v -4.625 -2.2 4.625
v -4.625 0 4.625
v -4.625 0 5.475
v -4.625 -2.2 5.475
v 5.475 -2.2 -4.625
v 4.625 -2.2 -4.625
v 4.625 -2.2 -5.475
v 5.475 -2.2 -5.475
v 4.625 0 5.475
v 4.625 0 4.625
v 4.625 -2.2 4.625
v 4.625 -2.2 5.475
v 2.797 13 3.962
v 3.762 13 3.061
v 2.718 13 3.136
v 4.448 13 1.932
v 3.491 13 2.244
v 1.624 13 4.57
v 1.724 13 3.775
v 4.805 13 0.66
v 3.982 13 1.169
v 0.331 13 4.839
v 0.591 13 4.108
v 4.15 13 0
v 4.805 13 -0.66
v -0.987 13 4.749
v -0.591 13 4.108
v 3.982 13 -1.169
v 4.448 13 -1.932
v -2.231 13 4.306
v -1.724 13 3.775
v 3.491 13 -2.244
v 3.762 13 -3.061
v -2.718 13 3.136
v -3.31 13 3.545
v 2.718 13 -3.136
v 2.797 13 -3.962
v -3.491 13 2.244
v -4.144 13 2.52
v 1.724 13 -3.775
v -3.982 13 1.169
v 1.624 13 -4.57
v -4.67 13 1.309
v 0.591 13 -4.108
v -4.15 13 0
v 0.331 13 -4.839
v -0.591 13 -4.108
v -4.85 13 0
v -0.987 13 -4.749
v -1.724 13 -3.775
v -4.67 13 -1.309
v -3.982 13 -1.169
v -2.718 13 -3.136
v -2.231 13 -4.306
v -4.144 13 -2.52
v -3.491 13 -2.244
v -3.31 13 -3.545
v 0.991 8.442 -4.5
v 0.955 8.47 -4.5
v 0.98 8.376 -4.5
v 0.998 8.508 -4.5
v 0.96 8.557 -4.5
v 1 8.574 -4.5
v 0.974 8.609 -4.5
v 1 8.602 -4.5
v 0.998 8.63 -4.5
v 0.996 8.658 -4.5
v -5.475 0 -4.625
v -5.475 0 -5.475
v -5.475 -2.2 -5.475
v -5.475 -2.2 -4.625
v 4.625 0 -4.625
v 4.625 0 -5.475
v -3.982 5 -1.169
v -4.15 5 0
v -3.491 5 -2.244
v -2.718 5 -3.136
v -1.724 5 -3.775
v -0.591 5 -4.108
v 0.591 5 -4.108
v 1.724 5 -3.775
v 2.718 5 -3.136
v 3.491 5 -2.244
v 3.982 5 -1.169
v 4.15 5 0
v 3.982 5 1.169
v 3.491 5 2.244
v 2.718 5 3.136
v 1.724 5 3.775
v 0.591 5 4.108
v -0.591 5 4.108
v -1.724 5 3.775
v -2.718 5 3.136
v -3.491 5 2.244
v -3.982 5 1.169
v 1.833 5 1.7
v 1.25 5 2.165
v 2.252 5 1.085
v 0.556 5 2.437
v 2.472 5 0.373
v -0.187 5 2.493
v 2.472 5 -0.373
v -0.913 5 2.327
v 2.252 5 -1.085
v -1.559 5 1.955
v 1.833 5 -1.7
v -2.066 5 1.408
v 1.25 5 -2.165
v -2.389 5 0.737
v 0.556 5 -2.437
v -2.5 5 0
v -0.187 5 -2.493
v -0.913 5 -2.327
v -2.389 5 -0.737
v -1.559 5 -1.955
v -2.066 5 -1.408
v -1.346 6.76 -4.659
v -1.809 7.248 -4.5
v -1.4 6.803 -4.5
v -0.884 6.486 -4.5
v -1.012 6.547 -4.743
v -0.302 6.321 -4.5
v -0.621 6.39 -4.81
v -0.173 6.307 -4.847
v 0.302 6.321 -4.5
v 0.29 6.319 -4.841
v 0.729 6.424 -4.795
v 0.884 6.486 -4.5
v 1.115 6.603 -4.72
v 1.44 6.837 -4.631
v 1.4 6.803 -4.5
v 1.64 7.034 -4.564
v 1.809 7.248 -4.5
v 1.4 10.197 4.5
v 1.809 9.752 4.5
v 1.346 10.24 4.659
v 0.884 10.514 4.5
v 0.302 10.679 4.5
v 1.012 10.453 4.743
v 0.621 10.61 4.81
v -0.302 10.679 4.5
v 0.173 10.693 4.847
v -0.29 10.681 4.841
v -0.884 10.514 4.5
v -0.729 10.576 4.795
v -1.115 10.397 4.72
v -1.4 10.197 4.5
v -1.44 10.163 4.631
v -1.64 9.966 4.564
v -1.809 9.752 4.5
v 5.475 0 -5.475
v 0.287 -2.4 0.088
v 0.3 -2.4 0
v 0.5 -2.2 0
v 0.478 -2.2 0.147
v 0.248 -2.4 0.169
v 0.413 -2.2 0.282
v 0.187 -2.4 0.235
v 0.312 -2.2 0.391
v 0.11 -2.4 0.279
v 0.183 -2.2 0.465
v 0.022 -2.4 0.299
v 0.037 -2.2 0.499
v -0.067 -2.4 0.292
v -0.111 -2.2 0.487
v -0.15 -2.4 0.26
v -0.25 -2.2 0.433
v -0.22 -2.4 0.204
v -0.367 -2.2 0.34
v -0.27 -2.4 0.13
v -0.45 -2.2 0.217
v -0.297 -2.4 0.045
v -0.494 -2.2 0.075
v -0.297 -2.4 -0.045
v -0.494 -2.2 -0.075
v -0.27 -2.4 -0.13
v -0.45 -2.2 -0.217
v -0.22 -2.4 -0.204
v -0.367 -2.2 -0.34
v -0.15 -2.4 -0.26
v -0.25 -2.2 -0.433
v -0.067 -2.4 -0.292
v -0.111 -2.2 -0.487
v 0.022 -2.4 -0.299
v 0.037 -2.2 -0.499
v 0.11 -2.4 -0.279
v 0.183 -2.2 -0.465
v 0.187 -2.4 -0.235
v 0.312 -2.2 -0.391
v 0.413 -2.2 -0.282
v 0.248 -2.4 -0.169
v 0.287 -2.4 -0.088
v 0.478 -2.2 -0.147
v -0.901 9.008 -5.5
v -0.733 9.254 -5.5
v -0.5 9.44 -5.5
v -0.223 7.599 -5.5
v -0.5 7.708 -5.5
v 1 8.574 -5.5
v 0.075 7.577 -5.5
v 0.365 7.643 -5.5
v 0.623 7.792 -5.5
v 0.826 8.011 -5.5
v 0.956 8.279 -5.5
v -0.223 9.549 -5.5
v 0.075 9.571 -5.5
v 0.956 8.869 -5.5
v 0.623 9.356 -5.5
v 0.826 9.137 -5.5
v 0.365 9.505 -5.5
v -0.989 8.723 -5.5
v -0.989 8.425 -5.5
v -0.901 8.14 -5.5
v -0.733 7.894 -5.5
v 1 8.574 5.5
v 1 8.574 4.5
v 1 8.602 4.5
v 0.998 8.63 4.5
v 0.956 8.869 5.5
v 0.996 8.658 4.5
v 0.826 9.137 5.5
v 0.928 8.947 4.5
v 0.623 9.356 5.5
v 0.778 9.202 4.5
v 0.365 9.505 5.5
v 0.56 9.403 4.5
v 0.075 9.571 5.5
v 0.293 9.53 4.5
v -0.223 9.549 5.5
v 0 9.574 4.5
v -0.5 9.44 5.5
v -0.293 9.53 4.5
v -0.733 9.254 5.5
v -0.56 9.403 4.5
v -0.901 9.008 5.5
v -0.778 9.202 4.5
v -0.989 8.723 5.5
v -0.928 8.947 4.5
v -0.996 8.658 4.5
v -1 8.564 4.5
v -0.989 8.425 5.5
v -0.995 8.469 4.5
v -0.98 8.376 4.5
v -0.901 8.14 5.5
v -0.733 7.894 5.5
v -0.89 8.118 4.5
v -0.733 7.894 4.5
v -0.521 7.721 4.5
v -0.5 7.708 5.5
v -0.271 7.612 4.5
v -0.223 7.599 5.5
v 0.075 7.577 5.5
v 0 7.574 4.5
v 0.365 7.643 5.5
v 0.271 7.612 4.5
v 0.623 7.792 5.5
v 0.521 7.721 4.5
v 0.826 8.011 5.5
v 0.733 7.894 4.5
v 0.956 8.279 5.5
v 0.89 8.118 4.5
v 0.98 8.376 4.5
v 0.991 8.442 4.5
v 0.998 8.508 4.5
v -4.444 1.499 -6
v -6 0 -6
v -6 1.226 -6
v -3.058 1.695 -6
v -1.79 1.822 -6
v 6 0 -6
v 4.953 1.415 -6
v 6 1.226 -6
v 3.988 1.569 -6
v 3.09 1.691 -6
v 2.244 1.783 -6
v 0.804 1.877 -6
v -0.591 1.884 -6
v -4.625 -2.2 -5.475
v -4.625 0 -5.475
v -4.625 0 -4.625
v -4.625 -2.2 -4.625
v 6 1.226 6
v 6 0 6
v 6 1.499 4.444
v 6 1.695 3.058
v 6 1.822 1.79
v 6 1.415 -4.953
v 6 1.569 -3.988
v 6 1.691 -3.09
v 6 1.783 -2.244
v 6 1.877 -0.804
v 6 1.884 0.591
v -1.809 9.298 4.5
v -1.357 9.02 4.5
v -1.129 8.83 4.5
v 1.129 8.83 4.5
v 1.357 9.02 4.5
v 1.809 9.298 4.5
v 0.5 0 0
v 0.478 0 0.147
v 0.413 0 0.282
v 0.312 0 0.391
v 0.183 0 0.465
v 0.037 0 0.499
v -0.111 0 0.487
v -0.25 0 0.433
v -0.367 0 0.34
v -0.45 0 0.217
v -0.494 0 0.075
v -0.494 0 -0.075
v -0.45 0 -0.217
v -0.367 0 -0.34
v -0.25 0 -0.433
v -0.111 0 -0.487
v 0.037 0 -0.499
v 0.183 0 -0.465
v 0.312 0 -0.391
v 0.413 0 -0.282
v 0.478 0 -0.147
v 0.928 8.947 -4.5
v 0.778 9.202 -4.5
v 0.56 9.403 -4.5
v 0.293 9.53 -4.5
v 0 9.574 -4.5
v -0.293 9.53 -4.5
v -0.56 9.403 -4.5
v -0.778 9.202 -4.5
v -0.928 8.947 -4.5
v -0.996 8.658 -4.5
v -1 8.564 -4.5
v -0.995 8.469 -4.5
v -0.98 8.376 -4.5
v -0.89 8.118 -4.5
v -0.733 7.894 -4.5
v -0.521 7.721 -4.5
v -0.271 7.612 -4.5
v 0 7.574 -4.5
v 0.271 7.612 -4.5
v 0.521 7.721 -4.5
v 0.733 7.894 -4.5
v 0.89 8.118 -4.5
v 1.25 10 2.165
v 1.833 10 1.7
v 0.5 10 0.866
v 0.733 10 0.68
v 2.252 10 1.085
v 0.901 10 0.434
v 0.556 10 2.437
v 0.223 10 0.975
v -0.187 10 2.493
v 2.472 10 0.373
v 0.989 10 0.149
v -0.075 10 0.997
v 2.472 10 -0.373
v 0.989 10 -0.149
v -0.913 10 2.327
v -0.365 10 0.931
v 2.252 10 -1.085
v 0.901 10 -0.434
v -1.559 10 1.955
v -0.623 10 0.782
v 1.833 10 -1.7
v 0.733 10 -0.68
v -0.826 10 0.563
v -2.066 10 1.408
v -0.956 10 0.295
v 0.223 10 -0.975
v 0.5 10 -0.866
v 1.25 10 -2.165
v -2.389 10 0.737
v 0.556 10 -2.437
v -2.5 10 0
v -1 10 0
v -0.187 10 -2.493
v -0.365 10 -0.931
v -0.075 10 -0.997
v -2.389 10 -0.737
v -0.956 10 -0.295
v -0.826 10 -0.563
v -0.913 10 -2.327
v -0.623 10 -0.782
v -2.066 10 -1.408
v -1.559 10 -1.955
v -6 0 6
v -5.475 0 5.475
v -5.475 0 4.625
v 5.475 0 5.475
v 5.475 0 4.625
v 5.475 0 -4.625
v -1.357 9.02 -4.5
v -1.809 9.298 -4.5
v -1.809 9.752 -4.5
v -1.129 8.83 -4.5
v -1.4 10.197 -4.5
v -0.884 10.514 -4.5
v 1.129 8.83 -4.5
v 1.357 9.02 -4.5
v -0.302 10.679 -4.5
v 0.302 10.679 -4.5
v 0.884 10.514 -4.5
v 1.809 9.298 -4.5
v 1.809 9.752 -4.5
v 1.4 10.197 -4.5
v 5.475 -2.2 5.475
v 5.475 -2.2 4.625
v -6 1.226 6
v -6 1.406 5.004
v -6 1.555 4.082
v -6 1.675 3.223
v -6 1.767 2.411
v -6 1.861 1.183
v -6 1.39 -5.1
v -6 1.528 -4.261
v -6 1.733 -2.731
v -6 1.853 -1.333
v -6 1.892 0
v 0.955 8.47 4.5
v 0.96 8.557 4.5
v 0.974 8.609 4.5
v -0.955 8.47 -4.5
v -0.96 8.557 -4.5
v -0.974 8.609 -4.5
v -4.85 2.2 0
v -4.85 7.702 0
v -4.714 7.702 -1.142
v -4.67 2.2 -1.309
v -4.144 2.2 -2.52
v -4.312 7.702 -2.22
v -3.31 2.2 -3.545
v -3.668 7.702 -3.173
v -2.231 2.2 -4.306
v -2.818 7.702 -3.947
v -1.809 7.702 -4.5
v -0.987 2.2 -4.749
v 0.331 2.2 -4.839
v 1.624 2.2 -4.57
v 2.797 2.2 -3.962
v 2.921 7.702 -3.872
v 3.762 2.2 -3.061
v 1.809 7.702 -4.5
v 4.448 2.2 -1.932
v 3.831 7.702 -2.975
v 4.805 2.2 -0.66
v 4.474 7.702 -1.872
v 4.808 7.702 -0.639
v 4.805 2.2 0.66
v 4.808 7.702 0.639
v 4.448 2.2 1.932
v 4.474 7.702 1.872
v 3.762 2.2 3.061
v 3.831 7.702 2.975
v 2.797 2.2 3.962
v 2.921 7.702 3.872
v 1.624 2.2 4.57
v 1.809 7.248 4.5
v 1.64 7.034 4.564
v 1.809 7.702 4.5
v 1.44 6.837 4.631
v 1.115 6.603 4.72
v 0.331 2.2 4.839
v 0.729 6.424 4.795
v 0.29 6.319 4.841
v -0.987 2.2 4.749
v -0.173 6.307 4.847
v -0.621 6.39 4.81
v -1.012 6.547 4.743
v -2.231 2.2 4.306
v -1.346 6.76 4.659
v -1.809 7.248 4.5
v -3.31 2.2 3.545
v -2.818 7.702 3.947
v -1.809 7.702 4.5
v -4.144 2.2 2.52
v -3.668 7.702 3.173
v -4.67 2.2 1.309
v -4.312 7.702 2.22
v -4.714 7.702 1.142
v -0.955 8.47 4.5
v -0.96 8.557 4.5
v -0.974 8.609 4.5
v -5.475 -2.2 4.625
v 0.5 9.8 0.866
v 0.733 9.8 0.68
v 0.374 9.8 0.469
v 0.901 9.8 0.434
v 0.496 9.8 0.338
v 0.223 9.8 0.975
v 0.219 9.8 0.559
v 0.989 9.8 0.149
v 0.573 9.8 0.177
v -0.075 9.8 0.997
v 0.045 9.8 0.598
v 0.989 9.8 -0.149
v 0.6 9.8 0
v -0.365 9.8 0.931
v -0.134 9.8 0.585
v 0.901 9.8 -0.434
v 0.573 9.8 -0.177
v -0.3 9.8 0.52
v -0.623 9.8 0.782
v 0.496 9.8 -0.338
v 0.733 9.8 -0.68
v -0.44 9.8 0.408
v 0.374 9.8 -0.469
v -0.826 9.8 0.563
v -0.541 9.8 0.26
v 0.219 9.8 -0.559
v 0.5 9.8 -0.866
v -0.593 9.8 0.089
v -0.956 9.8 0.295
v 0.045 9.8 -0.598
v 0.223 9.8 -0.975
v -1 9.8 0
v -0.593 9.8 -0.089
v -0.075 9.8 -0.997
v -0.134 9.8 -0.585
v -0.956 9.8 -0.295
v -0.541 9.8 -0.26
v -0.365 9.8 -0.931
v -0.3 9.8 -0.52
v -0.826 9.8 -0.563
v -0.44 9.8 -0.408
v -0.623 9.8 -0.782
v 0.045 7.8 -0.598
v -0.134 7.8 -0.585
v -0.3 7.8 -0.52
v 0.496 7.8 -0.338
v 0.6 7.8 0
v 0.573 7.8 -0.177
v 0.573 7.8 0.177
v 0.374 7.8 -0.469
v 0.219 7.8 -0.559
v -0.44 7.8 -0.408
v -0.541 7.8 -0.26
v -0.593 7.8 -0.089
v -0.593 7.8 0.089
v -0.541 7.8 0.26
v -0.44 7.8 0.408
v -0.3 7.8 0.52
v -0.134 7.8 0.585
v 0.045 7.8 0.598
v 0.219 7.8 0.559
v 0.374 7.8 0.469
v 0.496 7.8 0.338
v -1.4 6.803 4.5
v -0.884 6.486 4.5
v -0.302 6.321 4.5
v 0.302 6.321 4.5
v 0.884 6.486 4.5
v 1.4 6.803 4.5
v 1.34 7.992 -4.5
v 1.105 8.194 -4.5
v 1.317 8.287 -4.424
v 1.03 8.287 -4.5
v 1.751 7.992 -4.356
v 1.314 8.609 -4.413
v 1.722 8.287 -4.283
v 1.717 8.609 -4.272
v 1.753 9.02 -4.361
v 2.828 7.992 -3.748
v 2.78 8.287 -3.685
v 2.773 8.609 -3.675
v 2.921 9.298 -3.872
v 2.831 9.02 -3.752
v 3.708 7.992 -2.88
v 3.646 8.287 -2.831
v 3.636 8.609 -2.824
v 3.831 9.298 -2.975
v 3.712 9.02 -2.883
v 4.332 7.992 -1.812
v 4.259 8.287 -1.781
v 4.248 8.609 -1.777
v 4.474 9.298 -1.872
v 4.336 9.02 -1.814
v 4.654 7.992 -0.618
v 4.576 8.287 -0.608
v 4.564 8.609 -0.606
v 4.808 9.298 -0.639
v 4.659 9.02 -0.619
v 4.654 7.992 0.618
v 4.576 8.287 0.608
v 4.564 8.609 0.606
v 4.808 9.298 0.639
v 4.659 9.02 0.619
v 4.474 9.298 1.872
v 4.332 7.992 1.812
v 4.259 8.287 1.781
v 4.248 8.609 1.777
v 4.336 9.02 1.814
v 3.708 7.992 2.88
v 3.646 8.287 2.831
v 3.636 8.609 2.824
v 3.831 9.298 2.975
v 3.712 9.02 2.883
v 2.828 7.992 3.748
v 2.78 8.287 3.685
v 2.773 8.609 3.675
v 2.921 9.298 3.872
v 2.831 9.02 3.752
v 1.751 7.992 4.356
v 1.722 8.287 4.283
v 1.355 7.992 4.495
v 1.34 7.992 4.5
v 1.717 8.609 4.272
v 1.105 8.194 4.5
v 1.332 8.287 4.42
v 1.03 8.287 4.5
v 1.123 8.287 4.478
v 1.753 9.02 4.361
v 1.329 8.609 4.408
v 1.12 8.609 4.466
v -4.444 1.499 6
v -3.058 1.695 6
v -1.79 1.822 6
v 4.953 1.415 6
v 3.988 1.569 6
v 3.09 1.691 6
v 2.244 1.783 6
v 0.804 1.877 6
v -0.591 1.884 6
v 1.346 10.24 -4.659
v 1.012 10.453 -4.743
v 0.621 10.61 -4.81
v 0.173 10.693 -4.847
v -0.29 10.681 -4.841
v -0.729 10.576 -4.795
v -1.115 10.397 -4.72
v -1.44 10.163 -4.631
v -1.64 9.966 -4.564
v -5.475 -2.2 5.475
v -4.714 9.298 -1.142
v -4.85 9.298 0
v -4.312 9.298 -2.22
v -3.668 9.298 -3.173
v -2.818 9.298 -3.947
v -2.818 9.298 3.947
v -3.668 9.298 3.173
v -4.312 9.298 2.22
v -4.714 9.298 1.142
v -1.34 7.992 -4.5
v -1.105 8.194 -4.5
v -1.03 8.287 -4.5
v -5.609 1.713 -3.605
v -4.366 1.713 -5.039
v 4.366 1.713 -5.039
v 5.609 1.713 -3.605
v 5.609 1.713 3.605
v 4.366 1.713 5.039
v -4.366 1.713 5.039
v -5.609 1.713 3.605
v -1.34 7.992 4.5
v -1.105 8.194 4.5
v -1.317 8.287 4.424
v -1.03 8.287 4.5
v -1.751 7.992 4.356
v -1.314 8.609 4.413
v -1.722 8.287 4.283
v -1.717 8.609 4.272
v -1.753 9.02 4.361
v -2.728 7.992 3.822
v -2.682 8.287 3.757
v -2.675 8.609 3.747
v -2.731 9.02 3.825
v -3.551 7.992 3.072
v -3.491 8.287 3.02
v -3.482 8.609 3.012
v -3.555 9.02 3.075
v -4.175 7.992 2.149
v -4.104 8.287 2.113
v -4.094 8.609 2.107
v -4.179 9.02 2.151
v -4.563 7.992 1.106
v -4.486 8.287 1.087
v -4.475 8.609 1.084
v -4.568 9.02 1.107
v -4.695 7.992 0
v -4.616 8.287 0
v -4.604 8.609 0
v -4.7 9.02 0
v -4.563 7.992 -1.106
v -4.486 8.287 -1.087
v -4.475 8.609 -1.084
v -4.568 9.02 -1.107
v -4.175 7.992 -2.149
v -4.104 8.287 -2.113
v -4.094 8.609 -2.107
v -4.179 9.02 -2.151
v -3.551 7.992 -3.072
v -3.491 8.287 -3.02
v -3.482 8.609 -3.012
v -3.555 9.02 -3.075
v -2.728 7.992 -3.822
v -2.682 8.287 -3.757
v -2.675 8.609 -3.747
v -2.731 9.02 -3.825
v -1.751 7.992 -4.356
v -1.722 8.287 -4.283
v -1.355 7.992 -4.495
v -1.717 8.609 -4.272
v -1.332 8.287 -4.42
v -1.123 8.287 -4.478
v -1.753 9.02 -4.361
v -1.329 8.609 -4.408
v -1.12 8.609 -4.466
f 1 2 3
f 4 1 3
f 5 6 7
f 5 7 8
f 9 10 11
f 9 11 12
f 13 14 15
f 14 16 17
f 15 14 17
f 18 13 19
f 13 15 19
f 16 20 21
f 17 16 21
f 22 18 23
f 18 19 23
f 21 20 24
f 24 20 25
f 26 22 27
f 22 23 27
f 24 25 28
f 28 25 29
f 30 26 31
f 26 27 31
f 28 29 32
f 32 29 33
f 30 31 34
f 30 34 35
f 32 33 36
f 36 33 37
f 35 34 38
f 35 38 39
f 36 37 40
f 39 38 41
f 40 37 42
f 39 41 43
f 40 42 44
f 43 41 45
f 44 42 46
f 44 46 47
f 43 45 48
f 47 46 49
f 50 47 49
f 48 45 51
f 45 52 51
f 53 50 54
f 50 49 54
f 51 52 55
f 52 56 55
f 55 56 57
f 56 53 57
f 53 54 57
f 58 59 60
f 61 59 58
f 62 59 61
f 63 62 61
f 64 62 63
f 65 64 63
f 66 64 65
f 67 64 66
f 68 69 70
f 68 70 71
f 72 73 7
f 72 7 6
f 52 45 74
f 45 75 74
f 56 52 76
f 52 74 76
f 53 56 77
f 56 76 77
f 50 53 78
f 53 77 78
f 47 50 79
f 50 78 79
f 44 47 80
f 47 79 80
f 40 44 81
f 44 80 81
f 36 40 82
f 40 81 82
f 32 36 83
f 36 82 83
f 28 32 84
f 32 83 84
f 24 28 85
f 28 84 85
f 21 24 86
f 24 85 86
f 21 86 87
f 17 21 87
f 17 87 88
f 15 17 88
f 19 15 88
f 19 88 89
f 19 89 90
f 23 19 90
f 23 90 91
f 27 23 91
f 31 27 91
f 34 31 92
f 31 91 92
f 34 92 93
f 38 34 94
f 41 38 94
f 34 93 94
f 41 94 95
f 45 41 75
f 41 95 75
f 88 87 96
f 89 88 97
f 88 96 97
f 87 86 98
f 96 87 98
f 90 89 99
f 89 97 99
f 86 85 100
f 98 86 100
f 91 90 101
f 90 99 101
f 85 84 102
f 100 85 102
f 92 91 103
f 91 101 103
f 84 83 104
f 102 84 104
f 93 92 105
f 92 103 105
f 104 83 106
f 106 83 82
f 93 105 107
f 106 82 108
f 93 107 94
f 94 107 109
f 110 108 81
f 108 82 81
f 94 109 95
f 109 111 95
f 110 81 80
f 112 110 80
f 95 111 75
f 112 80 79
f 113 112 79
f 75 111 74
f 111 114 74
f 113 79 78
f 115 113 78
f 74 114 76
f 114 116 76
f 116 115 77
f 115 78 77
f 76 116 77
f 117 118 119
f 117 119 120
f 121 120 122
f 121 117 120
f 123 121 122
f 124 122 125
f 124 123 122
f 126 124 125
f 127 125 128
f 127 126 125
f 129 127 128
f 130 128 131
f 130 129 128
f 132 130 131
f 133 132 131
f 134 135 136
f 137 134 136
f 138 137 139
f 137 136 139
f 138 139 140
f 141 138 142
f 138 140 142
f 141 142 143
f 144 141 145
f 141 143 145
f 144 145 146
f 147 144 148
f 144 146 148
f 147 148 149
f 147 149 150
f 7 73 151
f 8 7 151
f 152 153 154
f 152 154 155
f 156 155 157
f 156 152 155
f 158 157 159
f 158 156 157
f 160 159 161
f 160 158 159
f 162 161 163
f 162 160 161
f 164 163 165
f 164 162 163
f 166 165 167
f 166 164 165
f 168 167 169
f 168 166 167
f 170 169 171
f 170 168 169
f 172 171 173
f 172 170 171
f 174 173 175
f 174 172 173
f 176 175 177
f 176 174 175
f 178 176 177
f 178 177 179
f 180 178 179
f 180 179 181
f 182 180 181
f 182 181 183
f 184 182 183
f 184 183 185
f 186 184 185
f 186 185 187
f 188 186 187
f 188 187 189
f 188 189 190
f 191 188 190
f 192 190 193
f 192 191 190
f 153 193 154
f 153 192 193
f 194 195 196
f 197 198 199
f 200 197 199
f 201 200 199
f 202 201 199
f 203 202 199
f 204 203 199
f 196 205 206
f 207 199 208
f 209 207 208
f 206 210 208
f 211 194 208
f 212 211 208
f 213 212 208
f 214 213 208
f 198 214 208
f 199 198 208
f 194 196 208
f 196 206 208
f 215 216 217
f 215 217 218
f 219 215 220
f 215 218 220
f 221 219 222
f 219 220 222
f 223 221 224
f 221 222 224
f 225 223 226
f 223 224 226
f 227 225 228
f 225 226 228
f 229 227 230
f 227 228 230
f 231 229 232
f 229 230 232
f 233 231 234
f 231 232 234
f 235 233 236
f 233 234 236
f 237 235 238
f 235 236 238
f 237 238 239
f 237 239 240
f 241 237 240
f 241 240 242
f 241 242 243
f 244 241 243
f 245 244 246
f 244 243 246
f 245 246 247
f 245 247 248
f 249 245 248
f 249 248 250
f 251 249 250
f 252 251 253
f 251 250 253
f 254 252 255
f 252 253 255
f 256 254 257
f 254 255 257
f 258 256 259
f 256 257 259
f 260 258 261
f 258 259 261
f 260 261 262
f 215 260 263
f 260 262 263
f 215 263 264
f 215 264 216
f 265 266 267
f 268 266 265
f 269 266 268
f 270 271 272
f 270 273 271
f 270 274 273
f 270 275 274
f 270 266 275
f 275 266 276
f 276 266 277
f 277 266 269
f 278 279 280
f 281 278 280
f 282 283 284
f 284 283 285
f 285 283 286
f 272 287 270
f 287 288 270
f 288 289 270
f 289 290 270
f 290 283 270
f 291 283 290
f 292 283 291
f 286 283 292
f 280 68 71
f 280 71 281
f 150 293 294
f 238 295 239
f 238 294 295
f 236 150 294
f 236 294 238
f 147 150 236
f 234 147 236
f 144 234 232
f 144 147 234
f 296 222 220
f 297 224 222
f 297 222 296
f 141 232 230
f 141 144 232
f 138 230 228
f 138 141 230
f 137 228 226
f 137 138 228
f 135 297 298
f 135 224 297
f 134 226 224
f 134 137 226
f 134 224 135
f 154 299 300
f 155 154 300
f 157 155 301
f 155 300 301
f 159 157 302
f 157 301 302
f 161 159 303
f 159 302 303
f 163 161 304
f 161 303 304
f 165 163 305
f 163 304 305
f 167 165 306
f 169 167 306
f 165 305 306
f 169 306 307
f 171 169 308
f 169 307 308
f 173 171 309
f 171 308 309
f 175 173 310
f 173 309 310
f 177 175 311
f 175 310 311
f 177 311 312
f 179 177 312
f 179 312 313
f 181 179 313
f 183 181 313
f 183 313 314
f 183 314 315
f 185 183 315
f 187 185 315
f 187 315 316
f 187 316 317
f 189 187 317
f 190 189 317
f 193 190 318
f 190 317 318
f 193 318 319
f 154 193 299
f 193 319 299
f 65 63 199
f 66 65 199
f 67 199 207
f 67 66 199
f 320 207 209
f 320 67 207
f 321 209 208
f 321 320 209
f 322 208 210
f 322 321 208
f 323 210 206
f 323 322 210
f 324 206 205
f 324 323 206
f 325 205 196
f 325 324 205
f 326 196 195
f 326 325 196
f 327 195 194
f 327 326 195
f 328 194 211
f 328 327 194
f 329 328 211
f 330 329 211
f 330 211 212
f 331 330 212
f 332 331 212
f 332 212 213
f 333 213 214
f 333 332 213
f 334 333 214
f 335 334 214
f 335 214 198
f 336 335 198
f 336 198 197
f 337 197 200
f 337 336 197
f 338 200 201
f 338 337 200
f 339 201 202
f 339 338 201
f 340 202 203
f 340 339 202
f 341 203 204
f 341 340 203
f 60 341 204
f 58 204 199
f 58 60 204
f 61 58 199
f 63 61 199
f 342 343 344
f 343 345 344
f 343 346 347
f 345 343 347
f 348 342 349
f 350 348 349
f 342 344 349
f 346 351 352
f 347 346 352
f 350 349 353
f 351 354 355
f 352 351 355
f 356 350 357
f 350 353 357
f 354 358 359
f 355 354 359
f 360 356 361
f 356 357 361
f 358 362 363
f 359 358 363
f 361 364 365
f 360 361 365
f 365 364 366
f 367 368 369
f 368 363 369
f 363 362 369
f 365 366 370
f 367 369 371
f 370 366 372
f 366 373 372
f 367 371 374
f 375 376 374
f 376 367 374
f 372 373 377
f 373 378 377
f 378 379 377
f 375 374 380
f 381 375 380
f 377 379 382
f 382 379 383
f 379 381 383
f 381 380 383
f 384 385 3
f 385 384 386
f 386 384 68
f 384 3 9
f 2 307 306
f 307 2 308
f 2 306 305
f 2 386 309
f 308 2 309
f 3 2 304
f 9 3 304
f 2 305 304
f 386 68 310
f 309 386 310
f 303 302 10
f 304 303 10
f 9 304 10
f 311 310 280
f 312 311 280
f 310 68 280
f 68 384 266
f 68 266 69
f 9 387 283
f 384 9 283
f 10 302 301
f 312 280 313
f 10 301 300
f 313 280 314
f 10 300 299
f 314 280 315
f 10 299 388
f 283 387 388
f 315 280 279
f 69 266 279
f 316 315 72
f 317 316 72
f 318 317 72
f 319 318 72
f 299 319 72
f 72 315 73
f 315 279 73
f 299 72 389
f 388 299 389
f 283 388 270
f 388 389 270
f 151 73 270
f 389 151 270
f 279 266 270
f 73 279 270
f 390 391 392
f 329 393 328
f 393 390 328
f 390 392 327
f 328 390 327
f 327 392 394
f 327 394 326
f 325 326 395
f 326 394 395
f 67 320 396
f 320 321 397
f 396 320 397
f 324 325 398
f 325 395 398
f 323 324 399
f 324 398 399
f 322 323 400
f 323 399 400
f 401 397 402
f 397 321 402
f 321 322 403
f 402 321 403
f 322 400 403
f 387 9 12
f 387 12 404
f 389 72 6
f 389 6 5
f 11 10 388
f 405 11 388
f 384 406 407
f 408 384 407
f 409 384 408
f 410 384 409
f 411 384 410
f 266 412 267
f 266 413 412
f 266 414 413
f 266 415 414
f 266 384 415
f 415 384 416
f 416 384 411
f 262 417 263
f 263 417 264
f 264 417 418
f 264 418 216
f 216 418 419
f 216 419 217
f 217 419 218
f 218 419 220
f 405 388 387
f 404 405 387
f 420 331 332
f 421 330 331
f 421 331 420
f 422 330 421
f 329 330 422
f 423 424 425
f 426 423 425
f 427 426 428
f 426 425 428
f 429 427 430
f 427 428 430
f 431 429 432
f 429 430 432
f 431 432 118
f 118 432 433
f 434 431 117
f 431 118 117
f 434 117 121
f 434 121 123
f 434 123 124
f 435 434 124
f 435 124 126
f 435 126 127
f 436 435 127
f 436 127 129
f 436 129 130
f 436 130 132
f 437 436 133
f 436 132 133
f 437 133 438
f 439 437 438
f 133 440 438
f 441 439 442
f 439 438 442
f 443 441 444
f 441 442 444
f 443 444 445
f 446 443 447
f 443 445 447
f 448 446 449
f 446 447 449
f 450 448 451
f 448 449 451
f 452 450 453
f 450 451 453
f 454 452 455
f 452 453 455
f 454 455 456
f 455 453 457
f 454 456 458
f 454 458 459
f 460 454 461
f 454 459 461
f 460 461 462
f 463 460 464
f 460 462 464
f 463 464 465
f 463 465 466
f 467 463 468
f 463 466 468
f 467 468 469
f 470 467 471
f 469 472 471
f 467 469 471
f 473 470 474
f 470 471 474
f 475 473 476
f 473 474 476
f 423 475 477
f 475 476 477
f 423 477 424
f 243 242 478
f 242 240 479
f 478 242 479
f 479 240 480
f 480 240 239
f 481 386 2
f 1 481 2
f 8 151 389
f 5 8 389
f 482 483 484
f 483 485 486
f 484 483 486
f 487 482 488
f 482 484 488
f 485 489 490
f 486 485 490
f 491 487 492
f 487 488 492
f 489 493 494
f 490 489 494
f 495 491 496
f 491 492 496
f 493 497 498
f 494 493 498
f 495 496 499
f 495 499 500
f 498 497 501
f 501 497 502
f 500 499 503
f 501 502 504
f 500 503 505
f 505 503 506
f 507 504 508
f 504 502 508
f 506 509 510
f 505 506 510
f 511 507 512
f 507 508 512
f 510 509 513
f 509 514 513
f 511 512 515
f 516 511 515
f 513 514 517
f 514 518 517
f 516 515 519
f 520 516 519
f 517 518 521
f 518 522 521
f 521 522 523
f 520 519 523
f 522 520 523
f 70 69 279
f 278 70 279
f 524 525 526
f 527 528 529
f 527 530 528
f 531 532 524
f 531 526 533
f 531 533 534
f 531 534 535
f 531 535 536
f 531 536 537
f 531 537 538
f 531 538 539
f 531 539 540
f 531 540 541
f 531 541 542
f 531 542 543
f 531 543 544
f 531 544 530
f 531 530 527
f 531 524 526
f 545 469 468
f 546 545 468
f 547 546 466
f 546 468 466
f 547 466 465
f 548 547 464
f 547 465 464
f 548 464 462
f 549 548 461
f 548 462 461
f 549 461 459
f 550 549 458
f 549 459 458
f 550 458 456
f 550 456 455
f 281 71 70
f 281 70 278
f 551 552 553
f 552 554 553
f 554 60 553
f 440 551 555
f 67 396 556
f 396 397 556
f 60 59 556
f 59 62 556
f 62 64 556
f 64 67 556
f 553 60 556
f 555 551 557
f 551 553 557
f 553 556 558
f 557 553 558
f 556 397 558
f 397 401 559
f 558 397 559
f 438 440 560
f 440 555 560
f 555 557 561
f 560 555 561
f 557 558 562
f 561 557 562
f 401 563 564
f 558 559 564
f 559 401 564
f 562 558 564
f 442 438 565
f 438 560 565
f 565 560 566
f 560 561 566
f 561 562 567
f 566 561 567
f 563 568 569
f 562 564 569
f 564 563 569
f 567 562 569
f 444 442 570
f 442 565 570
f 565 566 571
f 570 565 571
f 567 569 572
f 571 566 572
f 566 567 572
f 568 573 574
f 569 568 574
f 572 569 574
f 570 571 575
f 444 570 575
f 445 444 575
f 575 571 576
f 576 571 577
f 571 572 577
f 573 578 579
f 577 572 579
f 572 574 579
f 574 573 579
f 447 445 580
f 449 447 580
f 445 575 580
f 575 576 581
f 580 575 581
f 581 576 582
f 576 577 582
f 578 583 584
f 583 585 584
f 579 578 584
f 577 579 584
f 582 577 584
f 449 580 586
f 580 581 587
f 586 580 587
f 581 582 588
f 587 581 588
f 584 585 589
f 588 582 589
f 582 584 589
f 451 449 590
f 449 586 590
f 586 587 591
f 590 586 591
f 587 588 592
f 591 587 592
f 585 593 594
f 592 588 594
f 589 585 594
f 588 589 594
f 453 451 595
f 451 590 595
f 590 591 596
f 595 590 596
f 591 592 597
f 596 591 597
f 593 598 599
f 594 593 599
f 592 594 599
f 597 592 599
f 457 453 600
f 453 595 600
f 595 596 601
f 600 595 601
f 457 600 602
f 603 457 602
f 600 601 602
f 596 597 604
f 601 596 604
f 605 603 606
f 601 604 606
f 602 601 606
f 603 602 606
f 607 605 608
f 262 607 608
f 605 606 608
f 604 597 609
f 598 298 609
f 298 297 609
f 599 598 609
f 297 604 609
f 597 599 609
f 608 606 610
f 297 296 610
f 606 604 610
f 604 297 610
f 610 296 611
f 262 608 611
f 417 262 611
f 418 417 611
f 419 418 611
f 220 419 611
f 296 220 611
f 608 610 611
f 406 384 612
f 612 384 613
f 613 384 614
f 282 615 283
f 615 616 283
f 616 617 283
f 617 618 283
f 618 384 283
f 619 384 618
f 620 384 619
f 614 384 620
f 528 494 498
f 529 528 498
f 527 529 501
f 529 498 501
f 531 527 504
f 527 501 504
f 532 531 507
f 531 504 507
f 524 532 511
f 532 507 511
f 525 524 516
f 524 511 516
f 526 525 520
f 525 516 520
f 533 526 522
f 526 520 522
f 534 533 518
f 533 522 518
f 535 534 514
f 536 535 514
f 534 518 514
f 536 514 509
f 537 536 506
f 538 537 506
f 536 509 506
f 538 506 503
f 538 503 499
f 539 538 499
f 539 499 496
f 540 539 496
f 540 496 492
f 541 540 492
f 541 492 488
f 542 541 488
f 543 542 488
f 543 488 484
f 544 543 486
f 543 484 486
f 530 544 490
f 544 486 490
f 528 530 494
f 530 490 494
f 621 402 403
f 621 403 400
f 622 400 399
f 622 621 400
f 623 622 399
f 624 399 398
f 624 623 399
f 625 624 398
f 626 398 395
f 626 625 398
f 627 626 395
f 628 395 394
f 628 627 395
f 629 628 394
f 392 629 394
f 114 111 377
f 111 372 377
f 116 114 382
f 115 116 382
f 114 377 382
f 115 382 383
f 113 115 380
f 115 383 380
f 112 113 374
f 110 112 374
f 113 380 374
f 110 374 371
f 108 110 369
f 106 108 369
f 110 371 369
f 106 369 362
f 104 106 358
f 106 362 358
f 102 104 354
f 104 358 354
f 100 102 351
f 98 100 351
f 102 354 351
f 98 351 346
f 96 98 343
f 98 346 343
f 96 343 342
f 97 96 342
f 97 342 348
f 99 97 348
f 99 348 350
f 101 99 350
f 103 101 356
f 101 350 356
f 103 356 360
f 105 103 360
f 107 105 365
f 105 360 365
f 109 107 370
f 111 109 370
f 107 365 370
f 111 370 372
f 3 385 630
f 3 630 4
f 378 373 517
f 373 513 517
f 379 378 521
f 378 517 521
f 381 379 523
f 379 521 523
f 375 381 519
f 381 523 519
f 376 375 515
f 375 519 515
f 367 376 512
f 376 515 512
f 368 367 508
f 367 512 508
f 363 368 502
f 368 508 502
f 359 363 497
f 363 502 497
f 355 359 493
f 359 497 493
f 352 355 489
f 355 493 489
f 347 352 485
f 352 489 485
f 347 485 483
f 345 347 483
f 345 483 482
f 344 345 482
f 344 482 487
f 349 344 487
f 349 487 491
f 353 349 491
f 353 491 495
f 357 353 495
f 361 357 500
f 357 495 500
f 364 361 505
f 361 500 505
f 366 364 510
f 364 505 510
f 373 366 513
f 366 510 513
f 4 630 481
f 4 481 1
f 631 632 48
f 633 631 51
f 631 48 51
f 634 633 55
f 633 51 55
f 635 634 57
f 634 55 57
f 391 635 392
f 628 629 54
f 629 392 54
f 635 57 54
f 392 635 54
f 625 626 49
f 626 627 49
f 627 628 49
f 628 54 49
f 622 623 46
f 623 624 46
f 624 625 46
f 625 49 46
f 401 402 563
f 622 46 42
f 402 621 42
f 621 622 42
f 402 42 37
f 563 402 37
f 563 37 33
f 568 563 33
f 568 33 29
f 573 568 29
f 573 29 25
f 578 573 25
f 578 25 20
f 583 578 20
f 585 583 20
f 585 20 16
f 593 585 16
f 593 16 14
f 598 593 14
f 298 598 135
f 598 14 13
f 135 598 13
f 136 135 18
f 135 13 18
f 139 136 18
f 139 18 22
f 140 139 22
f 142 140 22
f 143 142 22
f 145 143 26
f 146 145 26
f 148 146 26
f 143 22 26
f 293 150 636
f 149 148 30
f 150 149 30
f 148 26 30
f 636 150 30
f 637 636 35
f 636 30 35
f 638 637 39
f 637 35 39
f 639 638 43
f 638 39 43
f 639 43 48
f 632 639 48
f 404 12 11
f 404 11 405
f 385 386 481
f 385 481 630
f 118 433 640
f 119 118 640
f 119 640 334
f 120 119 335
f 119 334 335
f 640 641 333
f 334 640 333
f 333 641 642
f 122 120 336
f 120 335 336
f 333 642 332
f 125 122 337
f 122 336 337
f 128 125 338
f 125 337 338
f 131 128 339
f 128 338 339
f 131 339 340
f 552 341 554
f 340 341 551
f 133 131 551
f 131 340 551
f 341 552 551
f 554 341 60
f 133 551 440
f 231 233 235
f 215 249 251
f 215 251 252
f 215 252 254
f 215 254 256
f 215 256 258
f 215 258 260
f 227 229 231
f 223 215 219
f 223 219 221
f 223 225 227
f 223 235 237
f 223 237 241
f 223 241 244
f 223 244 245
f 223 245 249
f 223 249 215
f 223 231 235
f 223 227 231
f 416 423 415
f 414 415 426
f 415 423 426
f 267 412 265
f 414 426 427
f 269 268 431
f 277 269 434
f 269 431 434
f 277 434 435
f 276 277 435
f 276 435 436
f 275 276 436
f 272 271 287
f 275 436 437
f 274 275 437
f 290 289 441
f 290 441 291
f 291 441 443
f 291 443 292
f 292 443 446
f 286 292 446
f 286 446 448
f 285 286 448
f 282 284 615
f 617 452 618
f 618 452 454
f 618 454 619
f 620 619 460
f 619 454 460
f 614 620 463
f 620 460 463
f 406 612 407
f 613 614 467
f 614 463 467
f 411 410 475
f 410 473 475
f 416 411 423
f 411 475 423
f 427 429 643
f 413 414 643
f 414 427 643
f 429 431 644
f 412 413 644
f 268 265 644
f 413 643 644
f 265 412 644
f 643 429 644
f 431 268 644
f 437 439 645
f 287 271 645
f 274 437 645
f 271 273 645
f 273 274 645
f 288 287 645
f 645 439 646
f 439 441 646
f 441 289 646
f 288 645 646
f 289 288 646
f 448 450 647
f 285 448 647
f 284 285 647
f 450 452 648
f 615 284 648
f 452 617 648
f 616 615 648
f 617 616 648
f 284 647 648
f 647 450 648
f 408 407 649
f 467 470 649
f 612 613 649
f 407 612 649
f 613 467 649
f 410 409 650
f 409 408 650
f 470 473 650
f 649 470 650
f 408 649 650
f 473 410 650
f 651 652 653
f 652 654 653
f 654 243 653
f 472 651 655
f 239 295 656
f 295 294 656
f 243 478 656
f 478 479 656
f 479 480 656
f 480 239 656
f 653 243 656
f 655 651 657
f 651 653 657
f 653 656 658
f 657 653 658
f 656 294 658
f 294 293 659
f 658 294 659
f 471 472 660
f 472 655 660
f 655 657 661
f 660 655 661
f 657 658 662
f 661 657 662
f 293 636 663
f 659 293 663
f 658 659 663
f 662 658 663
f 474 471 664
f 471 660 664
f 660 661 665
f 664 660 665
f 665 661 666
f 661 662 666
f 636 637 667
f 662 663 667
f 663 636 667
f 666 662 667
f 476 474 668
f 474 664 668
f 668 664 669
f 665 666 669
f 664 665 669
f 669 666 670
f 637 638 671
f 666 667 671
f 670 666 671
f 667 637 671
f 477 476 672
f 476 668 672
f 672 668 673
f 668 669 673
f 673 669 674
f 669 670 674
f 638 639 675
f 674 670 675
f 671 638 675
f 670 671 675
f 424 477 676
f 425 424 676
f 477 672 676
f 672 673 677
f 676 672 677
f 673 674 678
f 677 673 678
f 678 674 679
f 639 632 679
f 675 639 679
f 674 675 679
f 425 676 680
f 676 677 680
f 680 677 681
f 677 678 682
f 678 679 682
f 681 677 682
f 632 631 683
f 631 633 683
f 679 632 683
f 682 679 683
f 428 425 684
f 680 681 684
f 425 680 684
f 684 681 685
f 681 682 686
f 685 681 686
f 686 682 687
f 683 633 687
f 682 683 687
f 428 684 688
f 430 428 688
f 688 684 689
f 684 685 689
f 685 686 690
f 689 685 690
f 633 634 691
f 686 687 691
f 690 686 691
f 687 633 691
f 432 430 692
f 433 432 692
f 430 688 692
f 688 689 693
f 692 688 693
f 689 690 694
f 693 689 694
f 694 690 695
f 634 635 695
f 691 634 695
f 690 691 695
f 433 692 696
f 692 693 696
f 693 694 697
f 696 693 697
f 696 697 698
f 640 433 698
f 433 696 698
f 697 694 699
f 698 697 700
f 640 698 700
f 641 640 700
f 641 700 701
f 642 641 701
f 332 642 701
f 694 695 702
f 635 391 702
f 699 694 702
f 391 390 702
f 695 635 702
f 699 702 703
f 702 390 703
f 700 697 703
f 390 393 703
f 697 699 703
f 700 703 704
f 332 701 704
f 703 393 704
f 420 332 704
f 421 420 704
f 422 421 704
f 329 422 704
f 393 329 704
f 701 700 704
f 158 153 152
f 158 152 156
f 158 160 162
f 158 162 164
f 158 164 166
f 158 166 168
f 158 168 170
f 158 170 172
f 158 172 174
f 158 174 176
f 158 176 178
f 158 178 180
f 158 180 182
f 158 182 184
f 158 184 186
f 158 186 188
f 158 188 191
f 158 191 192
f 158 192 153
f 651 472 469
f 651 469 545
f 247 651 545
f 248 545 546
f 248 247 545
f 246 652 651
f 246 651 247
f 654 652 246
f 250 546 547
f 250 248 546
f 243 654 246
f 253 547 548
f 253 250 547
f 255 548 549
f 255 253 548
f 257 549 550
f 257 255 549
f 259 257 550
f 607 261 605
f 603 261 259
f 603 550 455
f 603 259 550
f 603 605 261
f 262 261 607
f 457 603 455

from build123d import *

# Parameters (mm, degrees)
ESQUISSE2_W                  = 22
ESQUISSE2_H                  = 22
ESQUISSE2_W_2                = 12
ESQUISSE2_H_2                = 12
ENL_V_MAT_EXTRU_4_DEPTH      = 14
ENL_V_MAT_EXTRU_4_DEPTH_BACK = 1
ESQUISSE3_W                  = 0.85
ESQUISSE3_H                  = 0.85
BOSS_EXTRU_1_DEPTH           = 2.2
ESQUISSE4_R                  = 0.6
ENL_V_MAT_EXTRU_5_DEPTH      = 2
ESQUISSE5_R                  = 2.2
ENL_V_MAT_EXTRU_6_DEPTH      = 1.5
ESQUISSE6_R                  = 1
BOSS_EXTRU_2_DEPTH           = 1
ESQUISSE7_R                  = 0.5
BOSS_EXTRU_3_DEPTH           = 2.4
CHANFREIN1_SIZE              = 0.2


with BuildPart() as part:
    # Esquisse1 → Révolution1 (revolve)
    with BuildSketch(Plane.XY):
        with BuildLine():
            Line((0, 0), (-10, 0))
            Line((-10, 0), (-10, 0.820061659))
            Line((-10, 0.820061659), (-4.85, 2.2))
            Line((-4.85, 2.2), (-4.85, 7.701564029))
            ThreePointArc((-4.85, 7.701564029), (-4.6, 8.5), (-4.85, 9.298435971))
            Line((-4.85, 9.298435971), (-4.85, 13))
            Line((-4.85, 13), (-4.15, 13))
            Line((-4.15, 13), (-4.15, 5))
            Line((-4.15, 5), (-2.5, 5))
            Line((-2.5, 5), (-2.5, 10))
            Line((-2.5, 10), (-1, 10))
            Line((-1, 10), (-1, 9.8))
            Line((-1, 9.8), (0, 9.8))
            Line((0, 9.8), (0, 0))
        make_face()
    revolve(axis=Axis((0, 9.8, 0), (0, -1, 0)))

    # Esquisse2 → Enlèv. mat.-Extru.4 (cut, two sides)
    with BuildSketch(Plane(origin=(0, 0, 0), x_dir=(1, 0, 0), z_dir=(0, 1, 0))) as enl_v_mat_extru_4_sk:
        Rectangle(ESQUISSE2_W, ESQUISSE2_H)
        Rectangle(ESQUISSE2_W_2, ESQUISSE2_H_2, mode=Mode.SUBTRACT)
    extrude(amount=ENL_V_MAT_EXTRU_4_DEPTH, mode=Mode.SUBTRACT)
    extrude(enl_v_mat_extru_4_sk.sketch, amount=-ENL_V_MAT_EXTRU_4_DEPTH_BACK, mode=Mode.SUBTRACT)

    # Esquisse3 → Boss.-Extru.1 (add)
    with BuildSketch(Plane.XZ):
        with Locations((5.05, -5.05)):
            Rectangle(ESQUISSE3_W, ESQUISSE3_H)
        with Locations((-5.05, -5.05)):
            Rectangle(ESQUISSE3_W, ESQUISSE3_H)
        with Locations((-5.05, 5.05)):
            Rectangle(ESQUISSE3_W, ESQUISSE3_H)
        with Locations((5.05, 5.05)):
            Rectangle(ESQUISSE3_W, ESQUISSE3_H)
    extrude(amount=BOSS_EXTRU_1_DEPTH)

    # Esquisse4 → Enlèv. mat.-Extru.5 (cut)
    with BuildSketch(Plane(origin=(0, 9.8, 0), x_dir=(1, 0, 0), z_dir=(0, 1, 0))):
        Circle(ESQUISSE4_R)
    extrude(amount=-ENL_V_MAT_EXTRU_5_DEPTH, mode=Mode.SUBTRACT)

    # Esquisse5 → Enlèv. mat.-Extru.6 (cut)
    with BuildSketch(Plane.XY.offset(6)):
        with Locations((0, 8.5)):
            Circle(ESQUISSE5_R)
    enl_v_mat_extru_6 = extrude(amount=-ENL_V_MAT_EXTRU_6_DEPTH, mode=Mode.SUBTRACT)

    # Esquisse6 → Boss.-Extru.2 (add)
    with BuildSketch(Plane.XY.offset(4.5)):
        with Locations((0, 8.574177758)):
            Circle(ESQUISSE6_R)
    boss_extru_2 = extrude(amount=BOSS_EXTRU_2_DEPTH)

    # Symétrie1: Enlèv. mat.-Extru.6, Boss.-Extru.2 across plane
    add(enl_v_mat_extru_6.mirror(Plane.XY), mode=Mode.SUBTRACT)
    add(boss_extru_2.mirror(Plane.XY))

    # Esquisse7 → Boss.-Extru.3 (add)
    with BuildSketch(Plane.XZ):
        Circle(ESQUISSE7_R)
    extrude(amount=BOSS_EXTRU_3_DEPTH)

    # Chanfrein1
    chanfrein1_edges = [part.edges().sort_by_distance(p)[0] for p in [
        (-0.5, -2.4, 0),
    ]]
    chamfer(chanfrein1_edges, length=CHANFREIN1_SIZE)


solid = part.part
